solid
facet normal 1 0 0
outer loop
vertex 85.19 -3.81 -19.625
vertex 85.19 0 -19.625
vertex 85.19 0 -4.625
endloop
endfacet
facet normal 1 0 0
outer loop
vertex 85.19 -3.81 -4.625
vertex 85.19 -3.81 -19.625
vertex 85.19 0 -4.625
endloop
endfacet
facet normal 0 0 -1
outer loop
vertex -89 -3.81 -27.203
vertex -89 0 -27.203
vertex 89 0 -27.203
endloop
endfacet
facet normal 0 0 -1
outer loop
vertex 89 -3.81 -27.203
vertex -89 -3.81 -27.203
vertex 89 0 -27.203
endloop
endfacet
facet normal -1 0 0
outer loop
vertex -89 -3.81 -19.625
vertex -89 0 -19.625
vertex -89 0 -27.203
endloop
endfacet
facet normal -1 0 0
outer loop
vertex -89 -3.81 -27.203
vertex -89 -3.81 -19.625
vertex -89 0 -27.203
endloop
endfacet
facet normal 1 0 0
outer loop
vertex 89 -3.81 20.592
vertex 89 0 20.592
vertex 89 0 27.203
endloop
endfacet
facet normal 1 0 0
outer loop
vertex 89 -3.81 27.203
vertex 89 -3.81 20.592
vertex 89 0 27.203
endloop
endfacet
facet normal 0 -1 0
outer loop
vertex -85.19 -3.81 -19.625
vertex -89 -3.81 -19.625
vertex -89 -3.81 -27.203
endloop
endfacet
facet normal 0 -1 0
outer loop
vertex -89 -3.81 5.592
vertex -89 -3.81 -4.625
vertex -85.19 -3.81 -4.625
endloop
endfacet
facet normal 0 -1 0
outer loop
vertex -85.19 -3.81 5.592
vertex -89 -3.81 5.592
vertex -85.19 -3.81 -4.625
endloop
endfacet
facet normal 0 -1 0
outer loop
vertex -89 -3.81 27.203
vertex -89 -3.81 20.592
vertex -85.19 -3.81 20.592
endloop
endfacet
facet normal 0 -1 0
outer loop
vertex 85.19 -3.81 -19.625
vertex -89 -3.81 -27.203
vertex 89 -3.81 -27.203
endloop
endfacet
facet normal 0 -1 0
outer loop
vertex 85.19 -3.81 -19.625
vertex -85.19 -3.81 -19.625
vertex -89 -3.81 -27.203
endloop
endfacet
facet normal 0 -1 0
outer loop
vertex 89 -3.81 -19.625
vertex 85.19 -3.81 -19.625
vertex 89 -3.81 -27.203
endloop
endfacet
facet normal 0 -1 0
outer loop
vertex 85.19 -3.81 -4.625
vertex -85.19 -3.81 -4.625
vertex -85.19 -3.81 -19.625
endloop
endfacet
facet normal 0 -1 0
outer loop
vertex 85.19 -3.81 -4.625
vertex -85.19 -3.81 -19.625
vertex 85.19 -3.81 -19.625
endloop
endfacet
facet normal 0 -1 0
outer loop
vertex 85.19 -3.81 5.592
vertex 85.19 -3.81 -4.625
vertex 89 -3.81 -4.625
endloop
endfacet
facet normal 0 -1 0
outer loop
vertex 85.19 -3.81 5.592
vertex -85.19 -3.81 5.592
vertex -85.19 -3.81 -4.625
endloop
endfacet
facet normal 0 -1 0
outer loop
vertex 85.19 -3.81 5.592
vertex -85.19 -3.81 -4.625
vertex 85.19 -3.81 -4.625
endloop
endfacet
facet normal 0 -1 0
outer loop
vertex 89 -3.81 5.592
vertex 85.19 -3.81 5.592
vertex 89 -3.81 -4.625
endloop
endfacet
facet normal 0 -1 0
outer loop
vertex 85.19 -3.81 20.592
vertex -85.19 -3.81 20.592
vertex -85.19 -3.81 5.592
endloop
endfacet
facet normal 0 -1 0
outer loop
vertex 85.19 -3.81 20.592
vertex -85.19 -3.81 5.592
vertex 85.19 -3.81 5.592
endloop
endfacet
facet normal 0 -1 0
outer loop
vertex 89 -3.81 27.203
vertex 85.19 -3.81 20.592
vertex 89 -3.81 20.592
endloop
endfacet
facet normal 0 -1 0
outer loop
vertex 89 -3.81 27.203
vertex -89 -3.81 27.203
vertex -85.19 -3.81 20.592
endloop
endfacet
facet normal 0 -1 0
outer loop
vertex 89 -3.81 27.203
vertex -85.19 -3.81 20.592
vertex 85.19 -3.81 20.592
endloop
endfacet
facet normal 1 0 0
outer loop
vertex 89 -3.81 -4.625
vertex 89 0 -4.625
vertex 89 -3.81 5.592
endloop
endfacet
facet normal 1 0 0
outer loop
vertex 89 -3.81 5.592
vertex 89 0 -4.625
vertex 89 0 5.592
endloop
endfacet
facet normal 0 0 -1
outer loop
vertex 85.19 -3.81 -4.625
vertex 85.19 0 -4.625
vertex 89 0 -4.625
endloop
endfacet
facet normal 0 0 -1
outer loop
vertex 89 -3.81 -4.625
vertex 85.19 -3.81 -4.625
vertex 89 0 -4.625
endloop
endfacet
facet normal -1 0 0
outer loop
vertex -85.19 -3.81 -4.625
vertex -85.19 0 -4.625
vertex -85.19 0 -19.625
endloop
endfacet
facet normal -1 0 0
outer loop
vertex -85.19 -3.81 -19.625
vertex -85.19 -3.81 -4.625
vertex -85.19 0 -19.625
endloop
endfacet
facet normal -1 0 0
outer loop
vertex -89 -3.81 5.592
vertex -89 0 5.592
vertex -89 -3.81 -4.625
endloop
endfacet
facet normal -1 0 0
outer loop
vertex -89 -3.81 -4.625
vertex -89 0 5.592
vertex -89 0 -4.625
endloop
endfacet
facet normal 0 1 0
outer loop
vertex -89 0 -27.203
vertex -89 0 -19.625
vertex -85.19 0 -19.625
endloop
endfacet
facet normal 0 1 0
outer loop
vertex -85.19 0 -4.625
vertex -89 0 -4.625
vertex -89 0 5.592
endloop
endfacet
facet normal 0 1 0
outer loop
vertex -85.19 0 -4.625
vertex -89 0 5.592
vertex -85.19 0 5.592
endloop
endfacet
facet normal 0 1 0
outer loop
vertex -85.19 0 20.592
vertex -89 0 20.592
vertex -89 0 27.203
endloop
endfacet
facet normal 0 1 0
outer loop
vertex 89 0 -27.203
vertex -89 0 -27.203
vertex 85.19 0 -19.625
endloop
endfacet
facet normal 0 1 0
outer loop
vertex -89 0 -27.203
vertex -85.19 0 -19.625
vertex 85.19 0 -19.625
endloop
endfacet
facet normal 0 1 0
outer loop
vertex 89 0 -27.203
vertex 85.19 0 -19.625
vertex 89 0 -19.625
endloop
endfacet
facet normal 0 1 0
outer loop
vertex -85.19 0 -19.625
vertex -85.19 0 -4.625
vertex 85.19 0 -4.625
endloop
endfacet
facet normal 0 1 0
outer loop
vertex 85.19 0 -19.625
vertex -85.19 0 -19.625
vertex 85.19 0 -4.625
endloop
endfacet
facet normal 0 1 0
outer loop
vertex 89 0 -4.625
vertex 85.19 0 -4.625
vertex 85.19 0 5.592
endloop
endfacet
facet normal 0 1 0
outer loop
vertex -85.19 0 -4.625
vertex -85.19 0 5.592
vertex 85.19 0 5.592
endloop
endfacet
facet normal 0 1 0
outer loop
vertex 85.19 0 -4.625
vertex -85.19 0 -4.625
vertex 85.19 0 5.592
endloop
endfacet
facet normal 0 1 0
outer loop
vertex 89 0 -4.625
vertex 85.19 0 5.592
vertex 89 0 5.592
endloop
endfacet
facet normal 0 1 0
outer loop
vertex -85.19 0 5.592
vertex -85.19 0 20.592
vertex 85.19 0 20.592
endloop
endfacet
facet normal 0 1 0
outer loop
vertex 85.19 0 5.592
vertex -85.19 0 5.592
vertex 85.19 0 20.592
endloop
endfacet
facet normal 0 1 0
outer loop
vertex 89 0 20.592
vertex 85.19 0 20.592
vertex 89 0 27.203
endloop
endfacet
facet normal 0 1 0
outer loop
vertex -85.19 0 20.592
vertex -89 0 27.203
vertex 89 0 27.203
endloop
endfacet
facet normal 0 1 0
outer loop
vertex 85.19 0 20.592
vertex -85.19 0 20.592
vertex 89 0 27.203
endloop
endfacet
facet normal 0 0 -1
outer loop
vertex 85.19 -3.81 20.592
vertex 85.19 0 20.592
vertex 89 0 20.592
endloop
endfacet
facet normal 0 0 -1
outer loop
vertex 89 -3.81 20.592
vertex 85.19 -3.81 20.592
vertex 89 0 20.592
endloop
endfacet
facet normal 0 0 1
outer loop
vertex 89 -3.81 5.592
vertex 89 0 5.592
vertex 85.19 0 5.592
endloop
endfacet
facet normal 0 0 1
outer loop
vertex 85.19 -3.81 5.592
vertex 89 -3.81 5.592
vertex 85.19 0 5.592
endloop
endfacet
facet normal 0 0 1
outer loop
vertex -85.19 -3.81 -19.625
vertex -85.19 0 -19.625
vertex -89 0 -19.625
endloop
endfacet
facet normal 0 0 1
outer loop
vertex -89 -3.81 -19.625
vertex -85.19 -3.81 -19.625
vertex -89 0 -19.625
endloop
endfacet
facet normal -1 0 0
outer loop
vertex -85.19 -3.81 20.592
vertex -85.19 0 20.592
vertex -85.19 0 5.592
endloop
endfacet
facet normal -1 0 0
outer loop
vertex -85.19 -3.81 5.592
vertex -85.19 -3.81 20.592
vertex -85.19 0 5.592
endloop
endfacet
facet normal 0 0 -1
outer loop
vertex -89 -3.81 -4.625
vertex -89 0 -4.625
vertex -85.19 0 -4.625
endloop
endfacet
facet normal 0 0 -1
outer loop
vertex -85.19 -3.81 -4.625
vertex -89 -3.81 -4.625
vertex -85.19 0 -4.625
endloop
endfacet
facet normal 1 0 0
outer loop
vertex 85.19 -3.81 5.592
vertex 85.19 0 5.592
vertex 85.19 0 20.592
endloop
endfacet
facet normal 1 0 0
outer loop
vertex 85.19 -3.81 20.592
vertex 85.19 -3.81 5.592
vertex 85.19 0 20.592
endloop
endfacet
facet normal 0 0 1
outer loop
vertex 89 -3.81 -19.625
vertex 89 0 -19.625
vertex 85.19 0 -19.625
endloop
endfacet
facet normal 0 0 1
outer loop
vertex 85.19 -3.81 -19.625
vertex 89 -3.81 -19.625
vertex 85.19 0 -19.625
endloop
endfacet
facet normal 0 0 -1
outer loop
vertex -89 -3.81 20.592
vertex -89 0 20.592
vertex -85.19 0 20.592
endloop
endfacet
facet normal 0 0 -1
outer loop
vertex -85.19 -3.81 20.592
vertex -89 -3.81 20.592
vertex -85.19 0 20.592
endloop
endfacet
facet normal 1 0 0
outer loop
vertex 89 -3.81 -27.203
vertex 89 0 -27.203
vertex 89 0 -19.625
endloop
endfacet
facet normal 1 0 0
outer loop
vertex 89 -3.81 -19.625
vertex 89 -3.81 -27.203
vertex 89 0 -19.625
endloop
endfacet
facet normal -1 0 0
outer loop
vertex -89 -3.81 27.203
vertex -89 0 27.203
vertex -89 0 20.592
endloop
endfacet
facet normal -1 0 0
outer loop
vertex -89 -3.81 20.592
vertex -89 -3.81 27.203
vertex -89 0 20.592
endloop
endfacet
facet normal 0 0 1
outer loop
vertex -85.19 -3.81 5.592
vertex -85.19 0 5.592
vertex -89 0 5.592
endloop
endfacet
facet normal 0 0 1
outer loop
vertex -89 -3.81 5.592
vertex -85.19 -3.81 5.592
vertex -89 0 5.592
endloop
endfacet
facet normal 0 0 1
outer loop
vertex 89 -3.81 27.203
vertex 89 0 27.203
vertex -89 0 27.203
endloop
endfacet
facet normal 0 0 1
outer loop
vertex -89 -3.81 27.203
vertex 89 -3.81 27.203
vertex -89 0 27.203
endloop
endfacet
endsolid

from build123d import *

# Parameters (mm, degrees)
F1_DEPTH = 3.81


# Not quite as in the source:
# - a feature names something its author has since deleted; it is built from what else it names


with BuildPart() as f1:
    # F0 (on Front) → F1 (new body)
    with BuildSketch(Plane.XZ):
        Polygon((89, 20.5917087717), (89, 27.203), (82.18, 27.203), (64, 27.203), (54, 27.203), (39, 27.203), (0, 27.203), (0, 0), (89, 0), (89, 5.5917087717), (85.19, 5.5917087717), (85.19, 20.5917087717), align=None)
        Polygon((-89, 0), (0, 0), (0, 27.203), (-39, 27.203), (-54, 27.203), (-64, 27.203), (-82.18, 27.203), (-89, 27.203), (-89, 20.5917087717), (-85.19, 20.5917087717), (-85.19, 5.5917087717), (-89, 5.5917087717), align=None)
        Polygon((0, -27.203), (0, 0), (-89, 0), (-89, -4.6252912283), (-85.19, -4.6252912283), (-85.19, -19.6252912283), (-89, -19.6252912283), (-89, -27.203), (-82.18, -27.203), (-64, -27.203), (-54, -27.203), (-39, -27.203), align=None)
        Polygon((89, -4.6252912283), (89, 0), (0, 0), (0, -27.203), (39, -27.203), (54, -27.203), (64, -27.203), (82.18, -27.203), (89, -27.203), (89, -19.6252912283), (85.19, -19.6252912283), (85.19, -4.6252912283), align=None)
    extrude(amount=F1_DEPTH)


solid = f1.part
